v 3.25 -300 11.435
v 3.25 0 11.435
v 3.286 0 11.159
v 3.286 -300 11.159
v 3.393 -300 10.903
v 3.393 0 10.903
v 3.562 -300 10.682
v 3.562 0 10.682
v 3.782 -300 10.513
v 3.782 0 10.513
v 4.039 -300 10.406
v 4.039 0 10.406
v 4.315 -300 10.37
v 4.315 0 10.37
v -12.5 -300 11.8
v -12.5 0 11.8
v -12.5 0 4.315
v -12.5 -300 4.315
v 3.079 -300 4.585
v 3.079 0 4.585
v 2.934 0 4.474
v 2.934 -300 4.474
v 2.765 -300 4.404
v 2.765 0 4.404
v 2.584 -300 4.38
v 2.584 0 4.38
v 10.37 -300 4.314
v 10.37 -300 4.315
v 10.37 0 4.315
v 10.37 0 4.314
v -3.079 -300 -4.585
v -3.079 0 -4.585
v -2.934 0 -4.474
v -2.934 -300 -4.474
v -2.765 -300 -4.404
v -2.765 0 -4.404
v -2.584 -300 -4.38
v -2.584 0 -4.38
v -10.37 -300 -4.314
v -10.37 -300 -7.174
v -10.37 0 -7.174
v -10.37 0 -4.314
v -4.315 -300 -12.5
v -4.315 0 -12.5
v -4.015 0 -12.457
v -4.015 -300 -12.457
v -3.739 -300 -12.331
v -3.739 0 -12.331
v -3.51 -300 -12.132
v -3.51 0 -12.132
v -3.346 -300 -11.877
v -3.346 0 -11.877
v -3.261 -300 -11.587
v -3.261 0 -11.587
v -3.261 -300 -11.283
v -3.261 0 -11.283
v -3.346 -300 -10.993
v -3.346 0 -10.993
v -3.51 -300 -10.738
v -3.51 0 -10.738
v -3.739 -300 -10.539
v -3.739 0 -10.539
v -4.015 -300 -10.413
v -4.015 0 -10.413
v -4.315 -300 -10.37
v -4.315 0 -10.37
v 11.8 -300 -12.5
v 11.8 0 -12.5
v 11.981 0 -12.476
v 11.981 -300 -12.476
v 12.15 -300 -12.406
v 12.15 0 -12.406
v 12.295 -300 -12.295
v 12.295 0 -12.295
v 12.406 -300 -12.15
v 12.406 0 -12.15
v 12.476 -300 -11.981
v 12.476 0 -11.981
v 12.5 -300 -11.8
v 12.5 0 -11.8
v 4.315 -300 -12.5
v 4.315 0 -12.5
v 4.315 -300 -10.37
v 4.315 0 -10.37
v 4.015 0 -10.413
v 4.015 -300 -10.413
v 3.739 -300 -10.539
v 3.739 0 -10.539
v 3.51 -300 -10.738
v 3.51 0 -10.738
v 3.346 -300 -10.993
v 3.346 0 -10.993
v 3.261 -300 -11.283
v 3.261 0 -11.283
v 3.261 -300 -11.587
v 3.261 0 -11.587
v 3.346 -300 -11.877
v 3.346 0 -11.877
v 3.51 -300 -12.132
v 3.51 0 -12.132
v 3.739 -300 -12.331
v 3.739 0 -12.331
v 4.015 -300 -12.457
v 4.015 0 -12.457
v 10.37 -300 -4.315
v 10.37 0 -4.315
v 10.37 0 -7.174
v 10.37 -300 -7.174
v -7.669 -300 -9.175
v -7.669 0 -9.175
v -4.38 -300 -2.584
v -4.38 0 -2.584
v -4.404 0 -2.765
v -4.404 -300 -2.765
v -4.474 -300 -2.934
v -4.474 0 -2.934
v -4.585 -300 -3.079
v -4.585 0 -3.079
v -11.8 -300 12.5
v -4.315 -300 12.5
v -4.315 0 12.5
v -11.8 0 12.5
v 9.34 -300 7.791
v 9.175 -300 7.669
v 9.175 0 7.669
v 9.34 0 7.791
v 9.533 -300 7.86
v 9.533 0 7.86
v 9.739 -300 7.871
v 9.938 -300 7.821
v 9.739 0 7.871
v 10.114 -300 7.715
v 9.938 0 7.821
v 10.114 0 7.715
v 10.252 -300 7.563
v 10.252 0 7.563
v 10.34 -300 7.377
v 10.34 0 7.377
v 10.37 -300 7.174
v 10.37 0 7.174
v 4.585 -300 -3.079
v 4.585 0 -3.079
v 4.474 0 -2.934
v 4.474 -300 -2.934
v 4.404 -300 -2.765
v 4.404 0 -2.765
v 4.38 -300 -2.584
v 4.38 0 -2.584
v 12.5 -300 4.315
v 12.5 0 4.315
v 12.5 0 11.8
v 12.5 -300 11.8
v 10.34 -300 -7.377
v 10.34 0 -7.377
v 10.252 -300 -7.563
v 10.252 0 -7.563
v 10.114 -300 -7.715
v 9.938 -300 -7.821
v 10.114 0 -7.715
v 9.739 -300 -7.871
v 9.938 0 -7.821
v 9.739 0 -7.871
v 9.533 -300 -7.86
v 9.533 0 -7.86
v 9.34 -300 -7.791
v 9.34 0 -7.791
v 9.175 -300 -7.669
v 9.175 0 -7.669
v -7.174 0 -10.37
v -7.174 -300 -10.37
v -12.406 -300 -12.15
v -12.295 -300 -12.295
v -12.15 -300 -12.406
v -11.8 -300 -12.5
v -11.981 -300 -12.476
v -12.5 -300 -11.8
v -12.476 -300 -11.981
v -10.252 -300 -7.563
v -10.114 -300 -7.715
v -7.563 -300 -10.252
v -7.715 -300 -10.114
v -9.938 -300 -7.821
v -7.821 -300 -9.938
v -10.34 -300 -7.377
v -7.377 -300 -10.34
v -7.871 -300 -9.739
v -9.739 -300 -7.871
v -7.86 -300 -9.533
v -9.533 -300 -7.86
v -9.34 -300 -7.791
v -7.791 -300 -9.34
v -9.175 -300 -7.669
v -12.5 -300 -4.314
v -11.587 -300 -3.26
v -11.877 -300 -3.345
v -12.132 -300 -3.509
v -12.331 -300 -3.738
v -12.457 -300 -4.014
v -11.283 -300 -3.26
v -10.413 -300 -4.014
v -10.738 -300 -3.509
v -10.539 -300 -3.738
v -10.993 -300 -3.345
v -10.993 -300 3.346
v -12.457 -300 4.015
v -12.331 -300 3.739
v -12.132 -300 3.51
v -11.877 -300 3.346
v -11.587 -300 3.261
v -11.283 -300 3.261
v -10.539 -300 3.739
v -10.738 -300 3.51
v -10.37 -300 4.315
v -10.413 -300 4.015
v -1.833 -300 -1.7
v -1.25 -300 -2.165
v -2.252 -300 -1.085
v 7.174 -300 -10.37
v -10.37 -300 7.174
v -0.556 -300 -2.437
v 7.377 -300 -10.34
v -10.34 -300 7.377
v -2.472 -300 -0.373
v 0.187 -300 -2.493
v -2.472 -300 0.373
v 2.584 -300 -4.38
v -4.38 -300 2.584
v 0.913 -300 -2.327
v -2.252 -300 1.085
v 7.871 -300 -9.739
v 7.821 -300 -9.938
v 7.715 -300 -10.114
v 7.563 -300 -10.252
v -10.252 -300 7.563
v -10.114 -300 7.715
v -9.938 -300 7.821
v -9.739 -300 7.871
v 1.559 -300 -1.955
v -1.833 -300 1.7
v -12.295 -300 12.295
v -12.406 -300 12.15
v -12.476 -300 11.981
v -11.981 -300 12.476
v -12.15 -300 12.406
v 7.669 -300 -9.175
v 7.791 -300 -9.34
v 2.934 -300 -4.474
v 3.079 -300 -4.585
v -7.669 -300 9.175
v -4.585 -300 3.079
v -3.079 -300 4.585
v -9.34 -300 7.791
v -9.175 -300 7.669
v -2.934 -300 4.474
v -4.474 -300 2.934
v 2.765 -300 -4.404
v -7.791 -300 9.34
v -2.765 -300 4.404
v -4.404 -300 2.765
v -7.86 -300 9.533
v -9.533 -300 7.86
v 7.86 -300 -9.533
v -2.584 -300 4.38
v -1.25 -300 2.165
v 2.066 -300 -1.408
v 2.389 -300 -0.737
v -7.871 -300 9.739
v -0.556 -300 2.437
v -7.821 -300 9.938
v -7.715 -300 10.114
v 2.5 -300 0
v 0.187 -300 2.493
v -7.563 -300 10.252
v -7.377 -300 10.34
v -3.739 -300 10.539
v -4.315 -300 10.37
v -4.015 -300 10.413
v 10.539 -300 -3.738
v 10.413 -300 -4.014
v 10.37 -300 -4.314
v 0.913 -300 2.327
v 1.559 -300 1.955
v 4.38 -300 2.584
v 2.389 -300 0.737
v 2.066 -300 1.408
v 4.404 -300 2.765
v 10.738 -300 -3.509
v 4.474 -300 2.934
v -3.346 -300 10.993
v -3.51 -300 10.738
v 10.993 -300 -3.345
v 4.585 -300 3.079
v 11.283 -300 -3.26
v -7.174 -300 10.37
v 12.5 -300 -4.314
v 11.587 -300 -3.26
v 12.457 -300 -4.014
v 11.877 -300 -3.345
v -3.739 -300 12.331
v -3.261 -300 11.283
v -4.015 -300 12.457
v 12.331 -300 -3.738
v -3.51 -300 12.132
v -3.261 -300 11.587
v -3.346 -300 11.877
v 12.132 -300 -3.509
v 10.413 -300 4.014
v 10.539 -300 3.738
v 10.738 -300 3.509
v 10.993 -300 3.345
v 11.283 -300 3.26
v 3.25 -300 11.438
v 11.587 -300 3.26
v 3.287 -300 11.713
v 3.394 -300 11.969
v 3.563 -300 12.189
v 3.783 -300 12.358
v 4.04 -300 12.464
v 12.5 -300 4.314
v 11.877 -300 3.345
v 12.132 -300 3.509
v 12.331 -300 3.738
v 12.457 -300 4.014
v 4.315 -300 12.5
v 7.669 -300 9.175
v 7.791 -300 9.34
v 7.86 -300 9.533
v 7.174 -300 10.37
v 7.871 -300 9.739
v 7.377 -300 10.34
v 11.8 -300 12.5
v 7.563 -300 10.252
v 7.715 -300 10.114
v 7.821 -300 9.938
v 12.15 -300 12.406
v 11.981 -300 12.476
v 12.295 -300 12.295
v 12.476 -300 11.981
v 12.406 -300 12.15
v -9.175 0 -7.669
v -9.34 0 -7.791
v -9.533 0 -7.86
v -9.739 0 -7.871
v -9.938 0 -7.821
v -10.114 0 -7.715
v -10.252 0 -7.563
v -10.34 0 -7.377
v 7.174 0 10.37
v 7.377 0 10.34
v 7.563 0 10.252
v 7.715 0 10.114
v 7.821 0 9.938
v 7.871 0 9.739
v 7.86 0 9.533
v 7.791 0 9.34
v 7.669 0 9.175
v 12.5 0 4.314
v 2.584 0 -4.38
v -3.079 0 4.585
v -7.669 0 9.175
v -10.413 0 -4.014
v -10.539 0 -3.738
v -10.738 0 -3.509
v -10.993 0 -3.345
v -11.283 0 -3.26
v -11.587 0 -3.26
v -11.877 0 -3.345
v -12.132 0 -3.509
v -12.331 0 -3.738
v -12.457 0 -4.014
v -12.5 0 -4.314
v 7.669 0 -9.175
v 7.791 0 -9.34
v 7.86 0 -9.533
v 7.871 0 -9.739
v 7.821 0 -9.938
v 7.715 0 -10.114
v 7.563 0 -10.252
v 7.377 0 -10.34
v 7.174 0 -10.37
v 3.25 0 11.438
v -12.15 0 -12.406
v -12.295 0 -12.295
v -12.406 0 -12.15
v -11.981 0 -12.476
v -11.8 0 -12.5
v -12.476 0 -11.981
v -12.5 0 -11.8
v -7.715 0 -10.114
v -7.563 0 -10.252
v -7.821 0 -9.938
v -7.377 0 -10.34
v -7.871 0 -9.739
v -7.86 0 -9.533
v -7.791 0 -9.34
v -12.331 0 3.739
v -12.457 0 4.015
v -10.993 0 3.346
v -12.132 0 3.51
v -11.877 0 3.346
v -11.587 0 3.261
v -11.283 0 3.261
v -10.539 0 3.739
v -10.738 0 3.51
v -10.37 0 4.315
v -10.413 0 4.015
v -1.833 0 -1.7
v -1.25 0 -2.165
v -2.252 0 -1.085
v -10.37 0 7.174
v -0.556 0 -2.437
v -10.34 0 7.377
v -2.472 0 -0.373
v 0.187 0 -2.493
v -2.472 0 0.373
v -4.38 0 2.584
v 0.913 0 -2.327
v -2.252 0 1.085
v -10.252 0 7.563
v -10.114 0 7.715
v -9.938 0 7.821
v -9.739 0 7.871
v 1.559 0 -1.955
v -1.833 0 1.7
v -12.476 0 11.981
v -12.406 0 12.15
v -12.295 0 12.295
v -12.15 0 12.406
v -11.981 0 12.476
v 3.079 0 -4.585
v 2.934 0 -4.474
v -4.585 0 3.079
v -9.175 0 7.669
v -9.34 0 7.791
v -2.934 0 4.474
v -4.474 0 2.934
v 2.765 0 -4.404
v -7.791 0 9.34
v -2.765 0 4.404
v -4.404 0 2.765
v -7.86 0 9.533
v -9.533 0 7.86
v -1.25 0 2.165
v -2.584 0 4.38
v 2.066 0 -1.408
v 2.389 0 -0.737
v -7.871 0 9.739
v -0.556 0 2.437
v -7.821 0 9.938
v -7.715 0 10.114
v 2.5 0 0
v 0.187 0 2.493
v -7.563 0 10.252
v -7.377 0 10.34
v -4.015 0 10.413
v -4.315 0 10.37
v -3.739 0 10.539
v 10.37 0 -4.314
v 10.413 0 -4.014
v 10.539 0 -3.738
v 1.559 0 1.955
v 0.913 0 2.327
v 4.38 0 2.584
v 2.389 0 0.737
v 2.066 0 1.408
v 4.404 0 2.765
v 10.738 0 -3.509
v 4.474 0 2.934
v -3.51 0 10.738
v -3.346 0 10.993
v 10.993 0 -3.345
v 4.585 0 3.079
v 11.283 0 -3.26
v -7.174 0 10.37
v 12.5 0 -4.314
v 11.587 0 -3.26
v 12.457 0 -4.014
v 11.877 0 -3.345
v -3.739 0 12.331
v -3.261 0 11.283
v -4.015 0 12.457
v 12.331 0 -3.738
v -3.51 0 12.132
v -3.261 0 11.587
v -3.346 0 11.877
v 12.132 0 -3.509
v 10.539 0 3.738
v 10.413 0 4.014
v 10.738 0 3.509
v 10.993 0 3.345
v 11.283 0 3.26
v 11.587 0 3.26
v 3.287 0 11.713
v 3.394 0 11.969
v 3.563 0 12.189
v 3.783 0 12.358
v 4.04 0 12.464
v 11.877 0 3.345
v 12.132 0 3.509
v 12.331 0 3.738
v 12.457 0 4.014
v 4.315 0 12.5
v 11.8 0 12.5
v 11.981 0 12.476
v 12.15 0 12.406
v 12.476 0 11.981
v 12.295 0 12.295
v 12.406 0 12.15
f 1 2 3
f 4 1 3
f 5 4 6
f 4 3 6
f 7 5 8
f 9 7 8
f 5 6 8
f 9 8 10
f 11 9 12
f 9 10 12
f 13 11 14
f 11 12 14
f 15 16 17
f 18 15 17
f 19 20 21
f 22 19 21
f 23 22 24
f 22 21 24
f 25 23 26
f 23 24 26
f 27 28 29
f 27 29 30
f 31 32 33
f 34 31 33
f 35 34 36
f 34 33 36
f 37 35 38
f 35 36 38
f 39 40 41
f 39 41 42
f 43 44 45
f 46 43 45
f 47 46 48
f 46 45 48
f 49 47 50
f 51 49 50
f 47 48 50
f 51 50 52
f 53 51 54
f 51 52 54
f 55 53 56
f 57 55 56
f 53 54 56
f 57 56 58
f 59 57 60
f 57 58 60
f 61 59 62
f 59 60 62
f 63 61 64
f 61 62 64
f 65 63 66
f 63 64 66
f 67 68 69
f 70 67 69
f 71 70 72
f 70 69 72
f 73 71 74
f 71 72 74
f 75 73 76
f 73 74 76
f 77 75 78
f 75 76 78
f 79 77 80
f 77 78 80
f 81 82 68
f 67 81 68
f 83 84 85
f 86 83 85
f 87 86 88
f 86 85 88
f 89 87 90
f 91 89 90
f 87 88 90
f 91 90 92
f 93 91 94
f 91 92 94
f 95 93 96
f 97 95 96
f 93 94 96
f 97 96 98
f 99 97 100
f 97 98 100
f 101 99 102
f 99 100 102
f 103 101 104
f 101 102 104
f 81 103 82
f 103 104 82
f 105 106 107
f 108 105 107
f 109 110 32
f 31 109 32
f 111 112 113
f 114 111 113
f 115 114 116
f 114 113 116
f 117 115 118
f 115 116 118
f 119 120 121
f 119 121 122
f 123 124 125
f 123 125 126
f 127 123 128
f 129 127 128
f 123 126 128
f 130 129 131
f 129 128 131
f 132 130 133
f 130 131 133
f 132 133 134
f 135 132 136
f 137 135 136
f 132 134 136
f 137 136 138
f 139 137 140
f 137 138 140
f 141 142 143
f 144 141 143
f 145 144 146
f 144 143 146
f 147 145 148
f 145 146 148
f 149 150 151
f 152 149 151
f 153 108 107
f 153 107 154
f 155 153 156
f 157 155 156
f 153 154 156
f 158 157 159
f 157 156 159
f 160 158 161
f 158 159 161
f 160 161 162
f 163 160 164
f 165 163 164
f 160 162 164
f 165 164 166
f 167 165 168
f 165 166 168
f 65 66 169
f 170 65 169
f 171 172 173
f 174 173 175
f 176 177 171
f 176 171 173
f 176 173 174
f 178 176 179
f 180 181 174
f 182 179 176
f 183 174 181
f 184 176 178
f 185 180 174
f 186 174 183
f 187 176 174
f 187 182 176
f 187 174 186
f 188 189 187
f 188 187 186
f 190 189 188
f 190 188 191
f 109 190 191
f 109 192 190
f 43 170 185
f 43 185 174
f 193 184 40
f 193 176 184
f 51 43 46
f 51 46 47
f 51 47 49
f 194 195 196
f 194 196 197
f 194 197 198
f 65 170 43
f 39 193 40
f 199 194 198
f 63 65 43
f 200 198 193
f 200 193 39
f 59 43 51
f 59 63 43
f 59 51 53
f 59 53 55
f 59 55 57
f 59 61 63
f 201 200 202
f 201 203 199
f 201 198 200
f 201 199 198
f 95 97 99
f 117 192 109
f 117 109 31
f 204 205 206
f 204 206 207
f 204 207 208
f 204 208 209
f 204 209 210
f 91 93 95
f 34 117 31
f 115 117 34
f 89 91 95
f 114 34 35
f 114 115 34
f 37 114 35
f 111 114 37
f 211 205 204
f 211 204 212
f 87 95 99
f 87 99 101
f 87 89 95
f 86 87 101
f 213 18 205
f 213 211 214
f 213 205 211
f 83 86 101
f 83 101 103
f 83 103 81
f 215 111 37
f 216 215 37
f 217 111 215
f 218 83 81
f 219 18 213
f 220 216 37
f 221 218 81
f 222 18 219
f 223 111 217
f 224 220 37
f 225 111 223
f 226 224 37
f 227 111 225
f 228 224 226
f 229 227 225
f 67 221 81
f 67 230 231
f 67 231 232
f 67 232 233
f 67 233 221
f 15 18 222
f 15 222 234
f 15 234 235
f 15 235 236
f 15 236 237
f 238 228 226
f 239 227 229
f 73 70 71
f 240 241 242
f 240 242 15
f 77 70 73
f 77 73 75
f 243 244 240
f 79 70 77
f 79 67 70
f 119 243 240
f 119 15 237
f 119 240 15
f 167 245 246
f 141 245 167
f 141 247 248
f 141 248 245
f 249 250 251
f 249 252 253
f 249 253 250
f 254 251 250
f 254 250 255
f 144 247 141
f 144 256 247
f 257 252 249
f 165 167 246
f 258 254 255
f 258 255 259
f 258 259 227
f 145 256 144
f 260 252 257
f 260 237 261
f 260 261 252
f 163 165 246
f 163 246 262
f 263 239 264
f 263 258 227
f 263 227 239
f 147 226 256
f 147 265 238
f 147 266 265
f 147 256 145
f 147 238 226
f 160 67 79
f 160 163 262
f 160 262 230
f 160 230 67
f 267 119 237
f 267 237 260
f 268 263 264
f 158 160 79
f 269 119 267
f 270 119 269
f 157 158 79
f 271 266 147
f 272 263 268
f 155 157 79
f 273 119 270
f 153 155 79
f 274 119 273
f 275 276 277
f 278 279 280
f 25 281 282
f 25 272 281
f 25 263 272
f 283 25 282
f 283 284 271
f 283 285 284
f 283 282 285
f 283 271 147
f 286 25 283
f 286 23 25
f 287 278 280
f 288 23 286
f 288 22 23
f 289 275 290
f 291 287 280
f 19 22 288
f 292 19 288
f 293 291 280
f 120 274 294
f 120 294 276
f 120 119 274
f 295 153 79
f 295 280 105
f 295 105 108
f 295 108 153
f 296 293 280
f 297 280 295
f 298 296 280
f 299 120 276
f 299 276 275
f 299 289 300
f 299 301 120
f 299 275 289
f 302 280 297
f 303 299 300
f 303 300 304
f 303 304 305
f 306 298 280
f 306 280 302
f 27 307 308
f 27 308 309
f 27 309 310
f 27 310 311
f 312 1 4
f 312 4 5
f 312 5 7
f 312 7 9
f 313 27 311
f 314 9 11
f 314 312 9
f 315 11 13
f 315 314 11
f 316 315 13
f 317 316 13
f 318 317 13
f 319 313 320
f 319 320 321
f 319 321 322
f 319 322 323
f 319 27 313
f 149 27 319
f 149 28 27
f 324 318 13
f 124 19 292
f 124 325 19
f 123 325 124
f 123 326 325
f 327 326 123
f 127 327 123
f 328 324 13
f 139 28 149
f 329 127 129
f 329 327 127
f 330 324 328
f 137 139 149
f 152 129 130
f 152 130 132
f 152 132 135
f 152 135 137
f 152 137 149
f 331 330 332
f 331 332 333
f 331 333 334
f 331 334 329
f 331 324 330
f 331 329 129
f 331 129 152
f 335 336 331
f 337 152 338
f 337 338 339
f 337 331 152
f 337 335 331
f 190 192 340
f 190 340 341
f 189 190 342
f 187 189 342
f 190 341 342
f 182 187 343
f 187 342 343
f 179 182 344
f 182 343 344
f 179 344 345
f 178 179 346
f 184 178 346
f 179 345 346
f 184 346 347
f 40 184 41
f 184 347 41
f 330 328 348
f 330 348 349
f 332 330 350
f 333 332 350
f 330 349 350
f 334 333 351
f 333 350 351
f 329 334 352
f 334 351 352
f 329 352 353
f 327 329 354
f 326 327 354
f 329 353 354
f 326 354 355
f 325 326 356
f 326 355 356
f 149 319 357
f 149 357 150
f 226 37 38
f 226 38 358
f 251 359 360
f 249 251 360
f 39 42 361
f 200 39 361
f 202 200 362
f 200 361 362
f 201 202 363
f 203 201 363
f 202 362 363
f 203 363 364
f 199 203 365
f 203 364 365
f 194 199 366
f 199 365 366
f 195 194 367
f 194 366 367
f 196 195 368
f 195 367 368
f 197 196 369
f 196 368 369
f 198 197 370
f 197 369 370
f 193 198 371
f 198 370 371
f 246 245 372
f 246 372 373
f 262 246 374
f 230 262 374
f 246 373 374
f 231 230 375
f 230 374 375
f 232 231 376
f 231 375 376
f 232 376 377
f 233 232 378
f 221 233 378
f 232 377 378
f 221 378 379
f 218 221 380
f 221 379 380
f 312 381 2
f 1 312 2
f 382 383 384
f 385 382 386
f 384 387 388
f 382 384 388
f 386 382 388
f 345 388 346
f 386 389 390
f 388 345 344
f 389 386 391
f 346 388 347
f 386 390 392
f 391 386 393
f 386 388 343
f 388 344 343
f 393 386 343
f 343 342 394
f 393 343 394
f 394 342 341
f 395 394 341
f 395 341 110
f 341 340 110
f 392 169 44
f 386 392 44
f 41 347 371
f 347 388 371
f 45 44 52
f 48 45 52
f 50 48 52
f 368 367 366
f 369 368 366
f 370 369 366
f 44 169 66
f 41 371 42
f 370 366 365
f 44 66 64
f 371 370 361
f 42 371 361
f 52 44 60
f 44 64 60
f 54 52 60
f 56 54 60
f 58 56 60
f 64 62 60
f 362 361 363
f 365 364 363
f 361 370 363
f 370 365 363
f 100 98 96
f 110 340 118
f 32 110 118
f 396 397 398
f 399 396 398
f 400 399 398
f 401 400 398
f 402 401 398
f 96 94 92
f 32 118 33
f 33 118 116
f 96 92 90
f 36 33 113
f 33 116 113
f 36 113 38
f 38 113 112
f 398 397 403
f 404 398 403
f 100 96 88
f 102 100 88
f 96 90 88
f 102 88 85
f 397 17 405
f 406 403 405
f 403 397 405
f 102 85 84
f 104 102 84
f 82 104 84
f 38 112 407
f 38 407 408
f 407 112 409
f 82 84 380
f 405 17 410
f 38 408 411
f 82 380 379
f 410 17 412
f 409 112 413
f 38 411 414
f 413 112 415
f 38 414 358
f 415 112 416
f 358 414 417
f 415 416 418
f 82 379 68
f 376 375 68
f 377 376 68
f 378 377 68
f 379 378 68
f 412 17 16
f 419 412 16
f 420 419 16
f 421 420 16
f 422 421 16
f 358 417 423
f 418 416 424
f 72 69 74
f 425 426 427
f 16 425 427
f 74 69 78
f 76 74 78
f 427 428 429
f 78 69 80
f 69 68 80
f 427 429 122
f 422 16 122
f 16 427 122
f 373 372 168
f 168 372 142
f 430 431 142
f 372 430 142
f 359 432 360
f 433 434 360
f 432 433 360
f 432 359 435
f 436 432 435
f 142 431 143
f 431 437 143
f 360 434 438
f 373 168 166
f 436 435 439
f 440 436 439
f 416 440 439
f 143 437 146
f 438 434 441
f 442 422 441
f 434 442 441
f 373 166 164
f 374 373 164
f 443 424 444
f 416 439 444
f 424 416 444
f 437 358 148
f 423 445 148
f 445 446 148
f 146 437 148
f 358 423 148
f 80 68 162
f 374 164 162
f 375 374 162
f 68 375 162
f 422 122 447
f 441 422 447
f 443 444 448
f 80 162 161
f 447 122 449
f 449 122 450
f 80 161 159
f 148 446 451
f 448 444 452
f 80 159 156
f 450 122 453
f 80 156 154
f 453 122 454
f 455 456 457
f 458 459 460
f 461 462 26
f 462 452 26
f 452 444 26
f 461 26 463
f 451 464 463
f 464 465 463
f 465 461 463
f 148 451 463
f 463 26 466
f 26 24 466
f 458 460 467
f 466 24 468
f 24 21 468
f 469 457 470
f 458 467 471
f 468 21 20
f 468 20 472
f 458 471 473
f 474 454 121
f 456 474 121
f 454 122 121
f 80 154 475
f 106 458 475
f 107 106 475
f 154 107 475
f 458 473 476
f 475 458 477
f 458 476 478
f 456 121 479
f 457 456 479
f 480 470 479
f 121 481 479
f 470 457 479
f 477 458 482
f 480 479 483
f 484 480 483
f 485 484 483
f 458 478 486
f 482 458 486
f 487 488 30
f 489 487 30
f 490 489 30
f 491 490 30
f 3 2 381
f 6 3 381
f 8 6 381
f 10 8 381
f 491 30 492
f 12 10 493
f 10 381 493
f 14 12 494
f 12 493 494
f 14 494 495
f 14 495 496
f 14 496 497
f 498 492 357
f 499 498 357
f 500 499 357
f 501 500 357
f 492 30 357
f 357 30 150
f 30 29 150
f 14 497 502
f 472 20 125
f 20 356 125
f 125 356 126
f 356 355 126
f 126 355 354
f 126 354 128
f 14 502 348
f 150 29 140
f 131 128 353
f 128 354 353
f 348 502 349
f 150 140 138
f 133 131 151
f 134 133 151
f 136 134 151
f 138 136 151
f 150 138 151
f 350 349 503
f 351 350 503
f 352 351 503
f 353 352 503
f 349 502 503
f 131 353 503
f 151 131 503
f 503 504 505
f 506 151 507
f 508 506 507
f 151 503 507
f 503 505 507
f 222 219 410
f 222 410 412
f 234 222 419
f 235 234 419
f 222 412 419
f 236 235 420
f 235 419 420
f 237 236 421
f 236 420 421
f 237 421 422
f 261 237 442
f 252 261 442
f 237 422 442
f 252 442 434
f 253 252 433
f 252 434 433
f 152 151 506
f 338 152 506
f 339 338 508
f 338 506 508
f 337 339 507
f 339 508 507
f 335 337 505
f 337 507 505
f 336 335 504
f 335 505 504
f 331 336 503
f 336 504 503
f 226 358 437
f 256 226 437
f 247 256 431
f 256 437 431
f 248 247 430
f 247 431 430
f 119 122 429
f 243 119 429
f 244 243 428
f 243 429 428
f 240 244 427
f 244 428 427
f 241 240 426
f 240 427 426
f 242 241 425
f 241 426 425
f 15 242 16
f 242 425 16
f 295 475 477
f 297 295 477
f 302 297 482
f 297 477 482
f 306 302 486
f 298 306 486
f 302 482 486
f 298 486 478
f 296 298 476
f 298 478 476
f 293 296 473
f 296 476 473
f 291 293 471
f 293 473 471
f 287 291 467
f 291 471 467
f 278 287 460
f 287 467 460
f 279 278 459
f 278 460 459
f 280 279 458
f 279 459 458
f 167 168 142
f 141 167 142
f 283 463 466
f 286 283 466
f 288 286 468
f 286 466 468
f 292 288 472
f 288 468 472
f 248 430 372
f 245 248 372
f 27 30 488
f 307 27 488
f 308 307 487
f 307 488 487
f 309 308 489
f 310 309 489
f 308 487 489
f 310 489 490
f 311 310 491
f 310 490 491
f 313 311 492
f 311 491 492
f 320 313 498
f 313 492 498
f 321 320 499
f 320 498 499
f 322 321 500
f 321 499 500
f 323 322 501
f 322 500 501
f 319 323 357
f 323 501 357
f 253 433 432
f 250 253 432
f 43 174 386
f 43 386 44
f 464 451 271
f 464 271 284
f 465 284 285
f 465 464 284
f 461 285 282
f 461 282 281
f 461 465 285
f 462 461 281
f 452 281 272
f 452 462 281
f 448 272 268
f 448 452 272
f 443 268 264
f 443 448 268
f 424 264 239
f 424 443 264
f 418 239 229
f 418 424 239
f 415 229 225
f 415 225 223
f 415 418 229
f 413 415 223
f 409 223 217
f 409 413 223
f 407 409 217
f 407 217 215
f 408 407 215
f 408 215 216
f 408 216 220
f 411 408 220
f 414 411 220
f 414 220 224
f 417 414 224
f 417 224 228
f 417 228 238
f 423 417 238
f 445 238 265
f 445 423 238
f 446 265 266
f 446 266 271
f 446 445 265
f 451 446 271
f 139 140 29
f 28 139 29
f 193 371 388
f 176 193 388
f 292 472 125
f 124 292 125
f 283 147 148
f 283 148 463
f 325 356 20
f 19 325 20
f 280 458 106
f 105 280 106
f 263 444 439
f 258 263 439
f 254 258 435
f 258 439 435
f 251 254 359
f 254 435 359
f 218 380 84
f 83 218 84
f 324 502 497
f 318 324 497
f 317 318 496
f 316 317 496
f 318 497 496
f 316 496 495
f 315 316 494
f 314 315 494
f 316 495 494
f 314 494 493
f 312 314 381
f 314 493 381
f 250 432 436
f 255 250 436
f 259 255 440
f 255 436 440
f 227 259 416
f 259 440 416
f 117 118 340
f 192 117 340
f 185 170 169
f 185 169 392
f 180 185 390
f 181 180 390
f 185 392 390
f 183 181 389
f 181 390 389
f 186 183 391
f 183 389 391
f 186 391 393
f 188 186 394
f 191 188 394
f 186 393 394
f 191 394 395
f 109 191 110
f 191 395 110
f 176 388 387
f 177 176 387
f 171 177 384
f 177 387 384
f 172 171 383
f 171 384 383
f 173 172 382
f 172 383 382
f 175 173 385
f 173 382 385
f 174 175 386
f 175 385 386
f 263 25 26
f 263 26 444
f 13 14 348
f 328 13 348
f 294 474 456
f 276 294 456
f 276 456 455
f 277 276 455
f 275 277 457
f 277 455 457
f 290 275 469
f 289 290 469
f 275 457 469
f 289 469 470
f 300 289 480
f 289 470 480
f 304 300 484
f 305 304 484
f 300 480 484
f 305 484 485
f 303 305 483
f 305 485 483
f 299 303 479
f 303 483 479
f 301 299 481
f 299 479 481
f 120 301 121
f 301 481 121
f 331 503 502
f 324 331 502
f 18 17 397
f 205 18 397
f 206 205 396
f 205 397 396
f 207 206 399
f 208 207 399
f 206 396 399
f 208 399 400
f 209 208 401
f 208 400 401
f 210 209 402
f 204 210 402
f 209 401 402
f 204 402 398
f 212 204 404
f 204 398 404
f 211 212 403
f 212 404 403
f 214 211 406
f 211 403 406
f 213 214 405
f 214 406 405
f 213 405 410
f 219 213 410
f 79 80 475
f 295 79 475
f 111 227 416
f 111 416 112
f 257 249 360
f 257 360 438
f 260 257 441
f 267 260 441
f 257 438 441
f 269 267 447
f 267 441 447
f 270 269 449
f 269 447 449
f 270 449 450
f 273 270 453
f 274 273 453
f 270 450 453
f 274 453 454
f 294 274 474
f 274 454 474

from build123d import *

# Parameters (mm, degrees)
F0_R     = 2.5
F1_DEPTH = 300


# Not quite as in the source:
# - ends of sketch curves that miss each other by under 0.0002 mm in the source are joined


with BuildPart() as f1:
    # F0 (on Front) → F1 (new body)
    with BuildSketch(Plane.XZ):
        with BuildLine():
            ThreePointArc((12.5, 11.8), (12.2949747468, 12.2949747468), (11.8, 12.5))
            Line((11.8, 12.5), (4.3149960966, 12.5))
            ThreePointArc((4.3149960966, 12.5), (3.5629475094, 12.1890874766), (3.25, 11.4378834224))
            Line((3.25, 11.4378834224), (3.2499960966, 11.4350005532))
            ThreePointArc((3.2499960966, 11.4350005532), (3.5619271791, 10.6819314736), (4.3149960966, 10.37))
            Line((4.3149960966, 10.37), (7.1739130624, 10.37))
            ThreePointArc((7.1739130624, 10.37), (7.8206287352, 9.9378784027), (7.6688878092, 9.1750252532))
            Line((7.6688878092, 9.1750252532), (3.0788878092, 4.5850252532))
            ThreePointArc((3.0788878092, 4.5850252532), (2.8517914651, 4.4332843272), (2.5839130624, 4.38))
            Line((2.5839130624, 4.38), (-2.5839130624, 4.38))
            ThreePointArc((-2.5839130624, 4.38), (-2.8517914651, 4.4332843272), (-3.0788878092, 4.5850252532))
            Line((-3.0788878092, 4.5850252532), (-7.6688878092, 9.1750252532))
            ThreePointArc((-7.6688878092, 9.1750252532), (-7.8206287352, 9.9378784027), (-7.1739130624, 10.37))
            Line((-7.1739130624, 10.37), (-4.3149983424, 10.37))
            ThreePointArc((-4.3149983424, 10.37), (-3.2499983424, 11.435), (-4.3149983424, 12.5))
            Line((-4.3149983424, 12.5), (-11.8, 12.5))
            ThreePointArc((-11.8, 12.5), (-12.2949747468, 12.2949747468), (-12.5, 11.8))
            Line((-12.5, 11.8), (-12.5, 4.3148727296))
            ThreePointArc((-12.5, 4.3148727296), (-11.435, 3.2498727296), (-10.37, 4.3148727296))
            Line((-10.37, 4.3148727296), (-10.37, 7.1739130624))
            ThreePointArc((-10.37, 7.1739130624), (-9.9378784027, 7.8206287352), (-9.1750252532, 7.6688878092))
            Line((-9.1750252532, 7.6688878092), (-4.5850252532, 3.0788878092))
            ThreePointArc((-4.5850252532, 3.0788878092), (-4.4332843272, 2.8517914651), (-4.38, 2.5839130624))
            Line((-4.38, 2.5839130624), (-4.38, -2.5839130624))
            ThreePointArc((-4.38, -2.5839130624), (-4.4332843272, -2.8517914651), (-4.5850252532, -3.0788878092))
            Line((-4.5850252532, -3.0788878092), (-9.1750252532, -7.6688878092))
            ThreePointArc((-9.1750252532, -7.6688878092), (-9.9378784027, -7.8206287352), (-10.37, -7.1739130624))
            Line((-10.37, -7.1739130624), (-10.37, -4.3142225218))
            ThreePointArc((-10.37, -4.3142225218), (-11.435, -3.2492225218), (-12.5, -4.3142225218))
            Line((-12.5, -4.3142225218), (-12.5, -11.8))
            ThreePointArc((-12.5, -11.8), (-12.2949747468, -12.2949747468), (-11.8, -12.5))
            Line((-11.8, -12.5), (-4.3149983424, -12.5))
            ThreePointArc((-4.3149983424, -12.5), (-3.2499983424, -11.435), (-4.3149983424, -10.37))
            Line((-4.3149983424, -10.37), (-7.1739130624, -10.37))
            ThreePointArc((-7.1739130624, -10.37), (-7.8206287352, -9.9378784027), (-7.6688878092, -9.1750252532))
            Line((-7.6688878092, -9.1750252532), (-3.0788878092, -4.5850252532))
            ThreePointArc((-3.0788878092, -4.5850252532), (-2.8517914651, -4.4332843272), (-2.5839130624, -4.38))
            Line((-2.5839130624, -4.38), (2.5839130624, -4.38))
            ThreePointArc((2.5839130624, -4.38), (2.8517914651, -4.4332843272), (3.0788878092, -4.5850252532))
            Line((3.0788878092, -4.5850252532), (7.6688878092, -9.1750252532))
            ThreePointArc((7.6688878092, -9.1750252532), (7.8206287352, -9.9378784027), (7.1739130624, -10.37))
            Line((7.1739130624, -10.37), (4.3149960966, -10.37))
            ThreePointArc((4.3149960966, -10.37), (3.2499960966, -11.435), (4.3149960966, -12.5))
            Line((4.3149960966, -12.5), (11.8, -12.5))
            ThreePointArc((11.8, -12.5), (12.2949747468, -12.2949747468), (12.5, -11.8))
            Line((12.5, -11.8), (12.5, -4.3148727296))
            Line((12.5, -4.3148727296), (12.5, -4.3142225218))
            ThreePointArc((12.5, -4.3142225218), (11.435, -3.2498727296), (10.3700001985, -4.314222522))
            Line((10.3700001985, -4.314222522), (10.37, -4.3148727296))
            Line((10.37, -4.3148727296), (10.37, -7.1739130624))
            ThreePointArc((10.37, -7.1739130624), (9.9378784027, -7.8206287352), (9.1750252532, -7.6688878092))
            Line((9.1750252532, -7.6688878092), (4.5850252532, -3.0788878092))
            ThreePointArc((4.5850252532, -3.0788878092), (4.4332843272, -2.8517914651), (4.38, -2.5839130624))
            Line((4.38, -2.5839130624), (4.38, 2.5839130624))
            ThreePointArc((4.38, 2.5839130624), (4.4332843272, 2.8517914651), (4.5850252532, 3.0788878092))
            Line((4.5850252532, 3.0788878092), (9.1750252532, 7.6688878092))
            ThreePointArc((9.1750252532, 7.6688878092), (9.9378784027, 7.8206287352), (10.37, 7.1739130624))
            Line((10.37, 7.1739130624), (10.37, 4.3148727296))
            ThreePointArc((10.37, 4.3148727296), (10.3700000496, 4.3145476258), (10.3700001985, 4.314222522))
            ThreePointArc((10.3700001985, 4.314222522), (11.435, 3.2498727296), (12.4999998015, 4.314222522))
            ThreePointArc((12.4999998015, 4.314222522), (12.4999999504, 4.3145476258), (12.5, 4.3148727296))
            Line((12.5, 4.3148727296), (12.5, 11.8))
        make_face()
        Circle(F0_R, mode=Mode.SUBTRACT)
        with BuildLine():
            ThreePointArc((10.37, 4.3142225218), (11.435, 3.2492225218), (12.5, 4.3142225218))
            ThreePointArc((12.5, 4.3142225218), (11.435, 3.2498727296), (10.37, 4.3142225218))
        make_face()
        with BuildLine():
            ThreePointArc((12.5, -4.3142225218), (11.435, -3.2492225218), (10.37, -4.3142225218))
            ThreePointArc((10.37, -4.3142225218), (11.435, -3.2498727296), (12.5, -4.3142225218))
        make_face()
    extrude(amount=F1_DEPTH)


solid = f1.part
